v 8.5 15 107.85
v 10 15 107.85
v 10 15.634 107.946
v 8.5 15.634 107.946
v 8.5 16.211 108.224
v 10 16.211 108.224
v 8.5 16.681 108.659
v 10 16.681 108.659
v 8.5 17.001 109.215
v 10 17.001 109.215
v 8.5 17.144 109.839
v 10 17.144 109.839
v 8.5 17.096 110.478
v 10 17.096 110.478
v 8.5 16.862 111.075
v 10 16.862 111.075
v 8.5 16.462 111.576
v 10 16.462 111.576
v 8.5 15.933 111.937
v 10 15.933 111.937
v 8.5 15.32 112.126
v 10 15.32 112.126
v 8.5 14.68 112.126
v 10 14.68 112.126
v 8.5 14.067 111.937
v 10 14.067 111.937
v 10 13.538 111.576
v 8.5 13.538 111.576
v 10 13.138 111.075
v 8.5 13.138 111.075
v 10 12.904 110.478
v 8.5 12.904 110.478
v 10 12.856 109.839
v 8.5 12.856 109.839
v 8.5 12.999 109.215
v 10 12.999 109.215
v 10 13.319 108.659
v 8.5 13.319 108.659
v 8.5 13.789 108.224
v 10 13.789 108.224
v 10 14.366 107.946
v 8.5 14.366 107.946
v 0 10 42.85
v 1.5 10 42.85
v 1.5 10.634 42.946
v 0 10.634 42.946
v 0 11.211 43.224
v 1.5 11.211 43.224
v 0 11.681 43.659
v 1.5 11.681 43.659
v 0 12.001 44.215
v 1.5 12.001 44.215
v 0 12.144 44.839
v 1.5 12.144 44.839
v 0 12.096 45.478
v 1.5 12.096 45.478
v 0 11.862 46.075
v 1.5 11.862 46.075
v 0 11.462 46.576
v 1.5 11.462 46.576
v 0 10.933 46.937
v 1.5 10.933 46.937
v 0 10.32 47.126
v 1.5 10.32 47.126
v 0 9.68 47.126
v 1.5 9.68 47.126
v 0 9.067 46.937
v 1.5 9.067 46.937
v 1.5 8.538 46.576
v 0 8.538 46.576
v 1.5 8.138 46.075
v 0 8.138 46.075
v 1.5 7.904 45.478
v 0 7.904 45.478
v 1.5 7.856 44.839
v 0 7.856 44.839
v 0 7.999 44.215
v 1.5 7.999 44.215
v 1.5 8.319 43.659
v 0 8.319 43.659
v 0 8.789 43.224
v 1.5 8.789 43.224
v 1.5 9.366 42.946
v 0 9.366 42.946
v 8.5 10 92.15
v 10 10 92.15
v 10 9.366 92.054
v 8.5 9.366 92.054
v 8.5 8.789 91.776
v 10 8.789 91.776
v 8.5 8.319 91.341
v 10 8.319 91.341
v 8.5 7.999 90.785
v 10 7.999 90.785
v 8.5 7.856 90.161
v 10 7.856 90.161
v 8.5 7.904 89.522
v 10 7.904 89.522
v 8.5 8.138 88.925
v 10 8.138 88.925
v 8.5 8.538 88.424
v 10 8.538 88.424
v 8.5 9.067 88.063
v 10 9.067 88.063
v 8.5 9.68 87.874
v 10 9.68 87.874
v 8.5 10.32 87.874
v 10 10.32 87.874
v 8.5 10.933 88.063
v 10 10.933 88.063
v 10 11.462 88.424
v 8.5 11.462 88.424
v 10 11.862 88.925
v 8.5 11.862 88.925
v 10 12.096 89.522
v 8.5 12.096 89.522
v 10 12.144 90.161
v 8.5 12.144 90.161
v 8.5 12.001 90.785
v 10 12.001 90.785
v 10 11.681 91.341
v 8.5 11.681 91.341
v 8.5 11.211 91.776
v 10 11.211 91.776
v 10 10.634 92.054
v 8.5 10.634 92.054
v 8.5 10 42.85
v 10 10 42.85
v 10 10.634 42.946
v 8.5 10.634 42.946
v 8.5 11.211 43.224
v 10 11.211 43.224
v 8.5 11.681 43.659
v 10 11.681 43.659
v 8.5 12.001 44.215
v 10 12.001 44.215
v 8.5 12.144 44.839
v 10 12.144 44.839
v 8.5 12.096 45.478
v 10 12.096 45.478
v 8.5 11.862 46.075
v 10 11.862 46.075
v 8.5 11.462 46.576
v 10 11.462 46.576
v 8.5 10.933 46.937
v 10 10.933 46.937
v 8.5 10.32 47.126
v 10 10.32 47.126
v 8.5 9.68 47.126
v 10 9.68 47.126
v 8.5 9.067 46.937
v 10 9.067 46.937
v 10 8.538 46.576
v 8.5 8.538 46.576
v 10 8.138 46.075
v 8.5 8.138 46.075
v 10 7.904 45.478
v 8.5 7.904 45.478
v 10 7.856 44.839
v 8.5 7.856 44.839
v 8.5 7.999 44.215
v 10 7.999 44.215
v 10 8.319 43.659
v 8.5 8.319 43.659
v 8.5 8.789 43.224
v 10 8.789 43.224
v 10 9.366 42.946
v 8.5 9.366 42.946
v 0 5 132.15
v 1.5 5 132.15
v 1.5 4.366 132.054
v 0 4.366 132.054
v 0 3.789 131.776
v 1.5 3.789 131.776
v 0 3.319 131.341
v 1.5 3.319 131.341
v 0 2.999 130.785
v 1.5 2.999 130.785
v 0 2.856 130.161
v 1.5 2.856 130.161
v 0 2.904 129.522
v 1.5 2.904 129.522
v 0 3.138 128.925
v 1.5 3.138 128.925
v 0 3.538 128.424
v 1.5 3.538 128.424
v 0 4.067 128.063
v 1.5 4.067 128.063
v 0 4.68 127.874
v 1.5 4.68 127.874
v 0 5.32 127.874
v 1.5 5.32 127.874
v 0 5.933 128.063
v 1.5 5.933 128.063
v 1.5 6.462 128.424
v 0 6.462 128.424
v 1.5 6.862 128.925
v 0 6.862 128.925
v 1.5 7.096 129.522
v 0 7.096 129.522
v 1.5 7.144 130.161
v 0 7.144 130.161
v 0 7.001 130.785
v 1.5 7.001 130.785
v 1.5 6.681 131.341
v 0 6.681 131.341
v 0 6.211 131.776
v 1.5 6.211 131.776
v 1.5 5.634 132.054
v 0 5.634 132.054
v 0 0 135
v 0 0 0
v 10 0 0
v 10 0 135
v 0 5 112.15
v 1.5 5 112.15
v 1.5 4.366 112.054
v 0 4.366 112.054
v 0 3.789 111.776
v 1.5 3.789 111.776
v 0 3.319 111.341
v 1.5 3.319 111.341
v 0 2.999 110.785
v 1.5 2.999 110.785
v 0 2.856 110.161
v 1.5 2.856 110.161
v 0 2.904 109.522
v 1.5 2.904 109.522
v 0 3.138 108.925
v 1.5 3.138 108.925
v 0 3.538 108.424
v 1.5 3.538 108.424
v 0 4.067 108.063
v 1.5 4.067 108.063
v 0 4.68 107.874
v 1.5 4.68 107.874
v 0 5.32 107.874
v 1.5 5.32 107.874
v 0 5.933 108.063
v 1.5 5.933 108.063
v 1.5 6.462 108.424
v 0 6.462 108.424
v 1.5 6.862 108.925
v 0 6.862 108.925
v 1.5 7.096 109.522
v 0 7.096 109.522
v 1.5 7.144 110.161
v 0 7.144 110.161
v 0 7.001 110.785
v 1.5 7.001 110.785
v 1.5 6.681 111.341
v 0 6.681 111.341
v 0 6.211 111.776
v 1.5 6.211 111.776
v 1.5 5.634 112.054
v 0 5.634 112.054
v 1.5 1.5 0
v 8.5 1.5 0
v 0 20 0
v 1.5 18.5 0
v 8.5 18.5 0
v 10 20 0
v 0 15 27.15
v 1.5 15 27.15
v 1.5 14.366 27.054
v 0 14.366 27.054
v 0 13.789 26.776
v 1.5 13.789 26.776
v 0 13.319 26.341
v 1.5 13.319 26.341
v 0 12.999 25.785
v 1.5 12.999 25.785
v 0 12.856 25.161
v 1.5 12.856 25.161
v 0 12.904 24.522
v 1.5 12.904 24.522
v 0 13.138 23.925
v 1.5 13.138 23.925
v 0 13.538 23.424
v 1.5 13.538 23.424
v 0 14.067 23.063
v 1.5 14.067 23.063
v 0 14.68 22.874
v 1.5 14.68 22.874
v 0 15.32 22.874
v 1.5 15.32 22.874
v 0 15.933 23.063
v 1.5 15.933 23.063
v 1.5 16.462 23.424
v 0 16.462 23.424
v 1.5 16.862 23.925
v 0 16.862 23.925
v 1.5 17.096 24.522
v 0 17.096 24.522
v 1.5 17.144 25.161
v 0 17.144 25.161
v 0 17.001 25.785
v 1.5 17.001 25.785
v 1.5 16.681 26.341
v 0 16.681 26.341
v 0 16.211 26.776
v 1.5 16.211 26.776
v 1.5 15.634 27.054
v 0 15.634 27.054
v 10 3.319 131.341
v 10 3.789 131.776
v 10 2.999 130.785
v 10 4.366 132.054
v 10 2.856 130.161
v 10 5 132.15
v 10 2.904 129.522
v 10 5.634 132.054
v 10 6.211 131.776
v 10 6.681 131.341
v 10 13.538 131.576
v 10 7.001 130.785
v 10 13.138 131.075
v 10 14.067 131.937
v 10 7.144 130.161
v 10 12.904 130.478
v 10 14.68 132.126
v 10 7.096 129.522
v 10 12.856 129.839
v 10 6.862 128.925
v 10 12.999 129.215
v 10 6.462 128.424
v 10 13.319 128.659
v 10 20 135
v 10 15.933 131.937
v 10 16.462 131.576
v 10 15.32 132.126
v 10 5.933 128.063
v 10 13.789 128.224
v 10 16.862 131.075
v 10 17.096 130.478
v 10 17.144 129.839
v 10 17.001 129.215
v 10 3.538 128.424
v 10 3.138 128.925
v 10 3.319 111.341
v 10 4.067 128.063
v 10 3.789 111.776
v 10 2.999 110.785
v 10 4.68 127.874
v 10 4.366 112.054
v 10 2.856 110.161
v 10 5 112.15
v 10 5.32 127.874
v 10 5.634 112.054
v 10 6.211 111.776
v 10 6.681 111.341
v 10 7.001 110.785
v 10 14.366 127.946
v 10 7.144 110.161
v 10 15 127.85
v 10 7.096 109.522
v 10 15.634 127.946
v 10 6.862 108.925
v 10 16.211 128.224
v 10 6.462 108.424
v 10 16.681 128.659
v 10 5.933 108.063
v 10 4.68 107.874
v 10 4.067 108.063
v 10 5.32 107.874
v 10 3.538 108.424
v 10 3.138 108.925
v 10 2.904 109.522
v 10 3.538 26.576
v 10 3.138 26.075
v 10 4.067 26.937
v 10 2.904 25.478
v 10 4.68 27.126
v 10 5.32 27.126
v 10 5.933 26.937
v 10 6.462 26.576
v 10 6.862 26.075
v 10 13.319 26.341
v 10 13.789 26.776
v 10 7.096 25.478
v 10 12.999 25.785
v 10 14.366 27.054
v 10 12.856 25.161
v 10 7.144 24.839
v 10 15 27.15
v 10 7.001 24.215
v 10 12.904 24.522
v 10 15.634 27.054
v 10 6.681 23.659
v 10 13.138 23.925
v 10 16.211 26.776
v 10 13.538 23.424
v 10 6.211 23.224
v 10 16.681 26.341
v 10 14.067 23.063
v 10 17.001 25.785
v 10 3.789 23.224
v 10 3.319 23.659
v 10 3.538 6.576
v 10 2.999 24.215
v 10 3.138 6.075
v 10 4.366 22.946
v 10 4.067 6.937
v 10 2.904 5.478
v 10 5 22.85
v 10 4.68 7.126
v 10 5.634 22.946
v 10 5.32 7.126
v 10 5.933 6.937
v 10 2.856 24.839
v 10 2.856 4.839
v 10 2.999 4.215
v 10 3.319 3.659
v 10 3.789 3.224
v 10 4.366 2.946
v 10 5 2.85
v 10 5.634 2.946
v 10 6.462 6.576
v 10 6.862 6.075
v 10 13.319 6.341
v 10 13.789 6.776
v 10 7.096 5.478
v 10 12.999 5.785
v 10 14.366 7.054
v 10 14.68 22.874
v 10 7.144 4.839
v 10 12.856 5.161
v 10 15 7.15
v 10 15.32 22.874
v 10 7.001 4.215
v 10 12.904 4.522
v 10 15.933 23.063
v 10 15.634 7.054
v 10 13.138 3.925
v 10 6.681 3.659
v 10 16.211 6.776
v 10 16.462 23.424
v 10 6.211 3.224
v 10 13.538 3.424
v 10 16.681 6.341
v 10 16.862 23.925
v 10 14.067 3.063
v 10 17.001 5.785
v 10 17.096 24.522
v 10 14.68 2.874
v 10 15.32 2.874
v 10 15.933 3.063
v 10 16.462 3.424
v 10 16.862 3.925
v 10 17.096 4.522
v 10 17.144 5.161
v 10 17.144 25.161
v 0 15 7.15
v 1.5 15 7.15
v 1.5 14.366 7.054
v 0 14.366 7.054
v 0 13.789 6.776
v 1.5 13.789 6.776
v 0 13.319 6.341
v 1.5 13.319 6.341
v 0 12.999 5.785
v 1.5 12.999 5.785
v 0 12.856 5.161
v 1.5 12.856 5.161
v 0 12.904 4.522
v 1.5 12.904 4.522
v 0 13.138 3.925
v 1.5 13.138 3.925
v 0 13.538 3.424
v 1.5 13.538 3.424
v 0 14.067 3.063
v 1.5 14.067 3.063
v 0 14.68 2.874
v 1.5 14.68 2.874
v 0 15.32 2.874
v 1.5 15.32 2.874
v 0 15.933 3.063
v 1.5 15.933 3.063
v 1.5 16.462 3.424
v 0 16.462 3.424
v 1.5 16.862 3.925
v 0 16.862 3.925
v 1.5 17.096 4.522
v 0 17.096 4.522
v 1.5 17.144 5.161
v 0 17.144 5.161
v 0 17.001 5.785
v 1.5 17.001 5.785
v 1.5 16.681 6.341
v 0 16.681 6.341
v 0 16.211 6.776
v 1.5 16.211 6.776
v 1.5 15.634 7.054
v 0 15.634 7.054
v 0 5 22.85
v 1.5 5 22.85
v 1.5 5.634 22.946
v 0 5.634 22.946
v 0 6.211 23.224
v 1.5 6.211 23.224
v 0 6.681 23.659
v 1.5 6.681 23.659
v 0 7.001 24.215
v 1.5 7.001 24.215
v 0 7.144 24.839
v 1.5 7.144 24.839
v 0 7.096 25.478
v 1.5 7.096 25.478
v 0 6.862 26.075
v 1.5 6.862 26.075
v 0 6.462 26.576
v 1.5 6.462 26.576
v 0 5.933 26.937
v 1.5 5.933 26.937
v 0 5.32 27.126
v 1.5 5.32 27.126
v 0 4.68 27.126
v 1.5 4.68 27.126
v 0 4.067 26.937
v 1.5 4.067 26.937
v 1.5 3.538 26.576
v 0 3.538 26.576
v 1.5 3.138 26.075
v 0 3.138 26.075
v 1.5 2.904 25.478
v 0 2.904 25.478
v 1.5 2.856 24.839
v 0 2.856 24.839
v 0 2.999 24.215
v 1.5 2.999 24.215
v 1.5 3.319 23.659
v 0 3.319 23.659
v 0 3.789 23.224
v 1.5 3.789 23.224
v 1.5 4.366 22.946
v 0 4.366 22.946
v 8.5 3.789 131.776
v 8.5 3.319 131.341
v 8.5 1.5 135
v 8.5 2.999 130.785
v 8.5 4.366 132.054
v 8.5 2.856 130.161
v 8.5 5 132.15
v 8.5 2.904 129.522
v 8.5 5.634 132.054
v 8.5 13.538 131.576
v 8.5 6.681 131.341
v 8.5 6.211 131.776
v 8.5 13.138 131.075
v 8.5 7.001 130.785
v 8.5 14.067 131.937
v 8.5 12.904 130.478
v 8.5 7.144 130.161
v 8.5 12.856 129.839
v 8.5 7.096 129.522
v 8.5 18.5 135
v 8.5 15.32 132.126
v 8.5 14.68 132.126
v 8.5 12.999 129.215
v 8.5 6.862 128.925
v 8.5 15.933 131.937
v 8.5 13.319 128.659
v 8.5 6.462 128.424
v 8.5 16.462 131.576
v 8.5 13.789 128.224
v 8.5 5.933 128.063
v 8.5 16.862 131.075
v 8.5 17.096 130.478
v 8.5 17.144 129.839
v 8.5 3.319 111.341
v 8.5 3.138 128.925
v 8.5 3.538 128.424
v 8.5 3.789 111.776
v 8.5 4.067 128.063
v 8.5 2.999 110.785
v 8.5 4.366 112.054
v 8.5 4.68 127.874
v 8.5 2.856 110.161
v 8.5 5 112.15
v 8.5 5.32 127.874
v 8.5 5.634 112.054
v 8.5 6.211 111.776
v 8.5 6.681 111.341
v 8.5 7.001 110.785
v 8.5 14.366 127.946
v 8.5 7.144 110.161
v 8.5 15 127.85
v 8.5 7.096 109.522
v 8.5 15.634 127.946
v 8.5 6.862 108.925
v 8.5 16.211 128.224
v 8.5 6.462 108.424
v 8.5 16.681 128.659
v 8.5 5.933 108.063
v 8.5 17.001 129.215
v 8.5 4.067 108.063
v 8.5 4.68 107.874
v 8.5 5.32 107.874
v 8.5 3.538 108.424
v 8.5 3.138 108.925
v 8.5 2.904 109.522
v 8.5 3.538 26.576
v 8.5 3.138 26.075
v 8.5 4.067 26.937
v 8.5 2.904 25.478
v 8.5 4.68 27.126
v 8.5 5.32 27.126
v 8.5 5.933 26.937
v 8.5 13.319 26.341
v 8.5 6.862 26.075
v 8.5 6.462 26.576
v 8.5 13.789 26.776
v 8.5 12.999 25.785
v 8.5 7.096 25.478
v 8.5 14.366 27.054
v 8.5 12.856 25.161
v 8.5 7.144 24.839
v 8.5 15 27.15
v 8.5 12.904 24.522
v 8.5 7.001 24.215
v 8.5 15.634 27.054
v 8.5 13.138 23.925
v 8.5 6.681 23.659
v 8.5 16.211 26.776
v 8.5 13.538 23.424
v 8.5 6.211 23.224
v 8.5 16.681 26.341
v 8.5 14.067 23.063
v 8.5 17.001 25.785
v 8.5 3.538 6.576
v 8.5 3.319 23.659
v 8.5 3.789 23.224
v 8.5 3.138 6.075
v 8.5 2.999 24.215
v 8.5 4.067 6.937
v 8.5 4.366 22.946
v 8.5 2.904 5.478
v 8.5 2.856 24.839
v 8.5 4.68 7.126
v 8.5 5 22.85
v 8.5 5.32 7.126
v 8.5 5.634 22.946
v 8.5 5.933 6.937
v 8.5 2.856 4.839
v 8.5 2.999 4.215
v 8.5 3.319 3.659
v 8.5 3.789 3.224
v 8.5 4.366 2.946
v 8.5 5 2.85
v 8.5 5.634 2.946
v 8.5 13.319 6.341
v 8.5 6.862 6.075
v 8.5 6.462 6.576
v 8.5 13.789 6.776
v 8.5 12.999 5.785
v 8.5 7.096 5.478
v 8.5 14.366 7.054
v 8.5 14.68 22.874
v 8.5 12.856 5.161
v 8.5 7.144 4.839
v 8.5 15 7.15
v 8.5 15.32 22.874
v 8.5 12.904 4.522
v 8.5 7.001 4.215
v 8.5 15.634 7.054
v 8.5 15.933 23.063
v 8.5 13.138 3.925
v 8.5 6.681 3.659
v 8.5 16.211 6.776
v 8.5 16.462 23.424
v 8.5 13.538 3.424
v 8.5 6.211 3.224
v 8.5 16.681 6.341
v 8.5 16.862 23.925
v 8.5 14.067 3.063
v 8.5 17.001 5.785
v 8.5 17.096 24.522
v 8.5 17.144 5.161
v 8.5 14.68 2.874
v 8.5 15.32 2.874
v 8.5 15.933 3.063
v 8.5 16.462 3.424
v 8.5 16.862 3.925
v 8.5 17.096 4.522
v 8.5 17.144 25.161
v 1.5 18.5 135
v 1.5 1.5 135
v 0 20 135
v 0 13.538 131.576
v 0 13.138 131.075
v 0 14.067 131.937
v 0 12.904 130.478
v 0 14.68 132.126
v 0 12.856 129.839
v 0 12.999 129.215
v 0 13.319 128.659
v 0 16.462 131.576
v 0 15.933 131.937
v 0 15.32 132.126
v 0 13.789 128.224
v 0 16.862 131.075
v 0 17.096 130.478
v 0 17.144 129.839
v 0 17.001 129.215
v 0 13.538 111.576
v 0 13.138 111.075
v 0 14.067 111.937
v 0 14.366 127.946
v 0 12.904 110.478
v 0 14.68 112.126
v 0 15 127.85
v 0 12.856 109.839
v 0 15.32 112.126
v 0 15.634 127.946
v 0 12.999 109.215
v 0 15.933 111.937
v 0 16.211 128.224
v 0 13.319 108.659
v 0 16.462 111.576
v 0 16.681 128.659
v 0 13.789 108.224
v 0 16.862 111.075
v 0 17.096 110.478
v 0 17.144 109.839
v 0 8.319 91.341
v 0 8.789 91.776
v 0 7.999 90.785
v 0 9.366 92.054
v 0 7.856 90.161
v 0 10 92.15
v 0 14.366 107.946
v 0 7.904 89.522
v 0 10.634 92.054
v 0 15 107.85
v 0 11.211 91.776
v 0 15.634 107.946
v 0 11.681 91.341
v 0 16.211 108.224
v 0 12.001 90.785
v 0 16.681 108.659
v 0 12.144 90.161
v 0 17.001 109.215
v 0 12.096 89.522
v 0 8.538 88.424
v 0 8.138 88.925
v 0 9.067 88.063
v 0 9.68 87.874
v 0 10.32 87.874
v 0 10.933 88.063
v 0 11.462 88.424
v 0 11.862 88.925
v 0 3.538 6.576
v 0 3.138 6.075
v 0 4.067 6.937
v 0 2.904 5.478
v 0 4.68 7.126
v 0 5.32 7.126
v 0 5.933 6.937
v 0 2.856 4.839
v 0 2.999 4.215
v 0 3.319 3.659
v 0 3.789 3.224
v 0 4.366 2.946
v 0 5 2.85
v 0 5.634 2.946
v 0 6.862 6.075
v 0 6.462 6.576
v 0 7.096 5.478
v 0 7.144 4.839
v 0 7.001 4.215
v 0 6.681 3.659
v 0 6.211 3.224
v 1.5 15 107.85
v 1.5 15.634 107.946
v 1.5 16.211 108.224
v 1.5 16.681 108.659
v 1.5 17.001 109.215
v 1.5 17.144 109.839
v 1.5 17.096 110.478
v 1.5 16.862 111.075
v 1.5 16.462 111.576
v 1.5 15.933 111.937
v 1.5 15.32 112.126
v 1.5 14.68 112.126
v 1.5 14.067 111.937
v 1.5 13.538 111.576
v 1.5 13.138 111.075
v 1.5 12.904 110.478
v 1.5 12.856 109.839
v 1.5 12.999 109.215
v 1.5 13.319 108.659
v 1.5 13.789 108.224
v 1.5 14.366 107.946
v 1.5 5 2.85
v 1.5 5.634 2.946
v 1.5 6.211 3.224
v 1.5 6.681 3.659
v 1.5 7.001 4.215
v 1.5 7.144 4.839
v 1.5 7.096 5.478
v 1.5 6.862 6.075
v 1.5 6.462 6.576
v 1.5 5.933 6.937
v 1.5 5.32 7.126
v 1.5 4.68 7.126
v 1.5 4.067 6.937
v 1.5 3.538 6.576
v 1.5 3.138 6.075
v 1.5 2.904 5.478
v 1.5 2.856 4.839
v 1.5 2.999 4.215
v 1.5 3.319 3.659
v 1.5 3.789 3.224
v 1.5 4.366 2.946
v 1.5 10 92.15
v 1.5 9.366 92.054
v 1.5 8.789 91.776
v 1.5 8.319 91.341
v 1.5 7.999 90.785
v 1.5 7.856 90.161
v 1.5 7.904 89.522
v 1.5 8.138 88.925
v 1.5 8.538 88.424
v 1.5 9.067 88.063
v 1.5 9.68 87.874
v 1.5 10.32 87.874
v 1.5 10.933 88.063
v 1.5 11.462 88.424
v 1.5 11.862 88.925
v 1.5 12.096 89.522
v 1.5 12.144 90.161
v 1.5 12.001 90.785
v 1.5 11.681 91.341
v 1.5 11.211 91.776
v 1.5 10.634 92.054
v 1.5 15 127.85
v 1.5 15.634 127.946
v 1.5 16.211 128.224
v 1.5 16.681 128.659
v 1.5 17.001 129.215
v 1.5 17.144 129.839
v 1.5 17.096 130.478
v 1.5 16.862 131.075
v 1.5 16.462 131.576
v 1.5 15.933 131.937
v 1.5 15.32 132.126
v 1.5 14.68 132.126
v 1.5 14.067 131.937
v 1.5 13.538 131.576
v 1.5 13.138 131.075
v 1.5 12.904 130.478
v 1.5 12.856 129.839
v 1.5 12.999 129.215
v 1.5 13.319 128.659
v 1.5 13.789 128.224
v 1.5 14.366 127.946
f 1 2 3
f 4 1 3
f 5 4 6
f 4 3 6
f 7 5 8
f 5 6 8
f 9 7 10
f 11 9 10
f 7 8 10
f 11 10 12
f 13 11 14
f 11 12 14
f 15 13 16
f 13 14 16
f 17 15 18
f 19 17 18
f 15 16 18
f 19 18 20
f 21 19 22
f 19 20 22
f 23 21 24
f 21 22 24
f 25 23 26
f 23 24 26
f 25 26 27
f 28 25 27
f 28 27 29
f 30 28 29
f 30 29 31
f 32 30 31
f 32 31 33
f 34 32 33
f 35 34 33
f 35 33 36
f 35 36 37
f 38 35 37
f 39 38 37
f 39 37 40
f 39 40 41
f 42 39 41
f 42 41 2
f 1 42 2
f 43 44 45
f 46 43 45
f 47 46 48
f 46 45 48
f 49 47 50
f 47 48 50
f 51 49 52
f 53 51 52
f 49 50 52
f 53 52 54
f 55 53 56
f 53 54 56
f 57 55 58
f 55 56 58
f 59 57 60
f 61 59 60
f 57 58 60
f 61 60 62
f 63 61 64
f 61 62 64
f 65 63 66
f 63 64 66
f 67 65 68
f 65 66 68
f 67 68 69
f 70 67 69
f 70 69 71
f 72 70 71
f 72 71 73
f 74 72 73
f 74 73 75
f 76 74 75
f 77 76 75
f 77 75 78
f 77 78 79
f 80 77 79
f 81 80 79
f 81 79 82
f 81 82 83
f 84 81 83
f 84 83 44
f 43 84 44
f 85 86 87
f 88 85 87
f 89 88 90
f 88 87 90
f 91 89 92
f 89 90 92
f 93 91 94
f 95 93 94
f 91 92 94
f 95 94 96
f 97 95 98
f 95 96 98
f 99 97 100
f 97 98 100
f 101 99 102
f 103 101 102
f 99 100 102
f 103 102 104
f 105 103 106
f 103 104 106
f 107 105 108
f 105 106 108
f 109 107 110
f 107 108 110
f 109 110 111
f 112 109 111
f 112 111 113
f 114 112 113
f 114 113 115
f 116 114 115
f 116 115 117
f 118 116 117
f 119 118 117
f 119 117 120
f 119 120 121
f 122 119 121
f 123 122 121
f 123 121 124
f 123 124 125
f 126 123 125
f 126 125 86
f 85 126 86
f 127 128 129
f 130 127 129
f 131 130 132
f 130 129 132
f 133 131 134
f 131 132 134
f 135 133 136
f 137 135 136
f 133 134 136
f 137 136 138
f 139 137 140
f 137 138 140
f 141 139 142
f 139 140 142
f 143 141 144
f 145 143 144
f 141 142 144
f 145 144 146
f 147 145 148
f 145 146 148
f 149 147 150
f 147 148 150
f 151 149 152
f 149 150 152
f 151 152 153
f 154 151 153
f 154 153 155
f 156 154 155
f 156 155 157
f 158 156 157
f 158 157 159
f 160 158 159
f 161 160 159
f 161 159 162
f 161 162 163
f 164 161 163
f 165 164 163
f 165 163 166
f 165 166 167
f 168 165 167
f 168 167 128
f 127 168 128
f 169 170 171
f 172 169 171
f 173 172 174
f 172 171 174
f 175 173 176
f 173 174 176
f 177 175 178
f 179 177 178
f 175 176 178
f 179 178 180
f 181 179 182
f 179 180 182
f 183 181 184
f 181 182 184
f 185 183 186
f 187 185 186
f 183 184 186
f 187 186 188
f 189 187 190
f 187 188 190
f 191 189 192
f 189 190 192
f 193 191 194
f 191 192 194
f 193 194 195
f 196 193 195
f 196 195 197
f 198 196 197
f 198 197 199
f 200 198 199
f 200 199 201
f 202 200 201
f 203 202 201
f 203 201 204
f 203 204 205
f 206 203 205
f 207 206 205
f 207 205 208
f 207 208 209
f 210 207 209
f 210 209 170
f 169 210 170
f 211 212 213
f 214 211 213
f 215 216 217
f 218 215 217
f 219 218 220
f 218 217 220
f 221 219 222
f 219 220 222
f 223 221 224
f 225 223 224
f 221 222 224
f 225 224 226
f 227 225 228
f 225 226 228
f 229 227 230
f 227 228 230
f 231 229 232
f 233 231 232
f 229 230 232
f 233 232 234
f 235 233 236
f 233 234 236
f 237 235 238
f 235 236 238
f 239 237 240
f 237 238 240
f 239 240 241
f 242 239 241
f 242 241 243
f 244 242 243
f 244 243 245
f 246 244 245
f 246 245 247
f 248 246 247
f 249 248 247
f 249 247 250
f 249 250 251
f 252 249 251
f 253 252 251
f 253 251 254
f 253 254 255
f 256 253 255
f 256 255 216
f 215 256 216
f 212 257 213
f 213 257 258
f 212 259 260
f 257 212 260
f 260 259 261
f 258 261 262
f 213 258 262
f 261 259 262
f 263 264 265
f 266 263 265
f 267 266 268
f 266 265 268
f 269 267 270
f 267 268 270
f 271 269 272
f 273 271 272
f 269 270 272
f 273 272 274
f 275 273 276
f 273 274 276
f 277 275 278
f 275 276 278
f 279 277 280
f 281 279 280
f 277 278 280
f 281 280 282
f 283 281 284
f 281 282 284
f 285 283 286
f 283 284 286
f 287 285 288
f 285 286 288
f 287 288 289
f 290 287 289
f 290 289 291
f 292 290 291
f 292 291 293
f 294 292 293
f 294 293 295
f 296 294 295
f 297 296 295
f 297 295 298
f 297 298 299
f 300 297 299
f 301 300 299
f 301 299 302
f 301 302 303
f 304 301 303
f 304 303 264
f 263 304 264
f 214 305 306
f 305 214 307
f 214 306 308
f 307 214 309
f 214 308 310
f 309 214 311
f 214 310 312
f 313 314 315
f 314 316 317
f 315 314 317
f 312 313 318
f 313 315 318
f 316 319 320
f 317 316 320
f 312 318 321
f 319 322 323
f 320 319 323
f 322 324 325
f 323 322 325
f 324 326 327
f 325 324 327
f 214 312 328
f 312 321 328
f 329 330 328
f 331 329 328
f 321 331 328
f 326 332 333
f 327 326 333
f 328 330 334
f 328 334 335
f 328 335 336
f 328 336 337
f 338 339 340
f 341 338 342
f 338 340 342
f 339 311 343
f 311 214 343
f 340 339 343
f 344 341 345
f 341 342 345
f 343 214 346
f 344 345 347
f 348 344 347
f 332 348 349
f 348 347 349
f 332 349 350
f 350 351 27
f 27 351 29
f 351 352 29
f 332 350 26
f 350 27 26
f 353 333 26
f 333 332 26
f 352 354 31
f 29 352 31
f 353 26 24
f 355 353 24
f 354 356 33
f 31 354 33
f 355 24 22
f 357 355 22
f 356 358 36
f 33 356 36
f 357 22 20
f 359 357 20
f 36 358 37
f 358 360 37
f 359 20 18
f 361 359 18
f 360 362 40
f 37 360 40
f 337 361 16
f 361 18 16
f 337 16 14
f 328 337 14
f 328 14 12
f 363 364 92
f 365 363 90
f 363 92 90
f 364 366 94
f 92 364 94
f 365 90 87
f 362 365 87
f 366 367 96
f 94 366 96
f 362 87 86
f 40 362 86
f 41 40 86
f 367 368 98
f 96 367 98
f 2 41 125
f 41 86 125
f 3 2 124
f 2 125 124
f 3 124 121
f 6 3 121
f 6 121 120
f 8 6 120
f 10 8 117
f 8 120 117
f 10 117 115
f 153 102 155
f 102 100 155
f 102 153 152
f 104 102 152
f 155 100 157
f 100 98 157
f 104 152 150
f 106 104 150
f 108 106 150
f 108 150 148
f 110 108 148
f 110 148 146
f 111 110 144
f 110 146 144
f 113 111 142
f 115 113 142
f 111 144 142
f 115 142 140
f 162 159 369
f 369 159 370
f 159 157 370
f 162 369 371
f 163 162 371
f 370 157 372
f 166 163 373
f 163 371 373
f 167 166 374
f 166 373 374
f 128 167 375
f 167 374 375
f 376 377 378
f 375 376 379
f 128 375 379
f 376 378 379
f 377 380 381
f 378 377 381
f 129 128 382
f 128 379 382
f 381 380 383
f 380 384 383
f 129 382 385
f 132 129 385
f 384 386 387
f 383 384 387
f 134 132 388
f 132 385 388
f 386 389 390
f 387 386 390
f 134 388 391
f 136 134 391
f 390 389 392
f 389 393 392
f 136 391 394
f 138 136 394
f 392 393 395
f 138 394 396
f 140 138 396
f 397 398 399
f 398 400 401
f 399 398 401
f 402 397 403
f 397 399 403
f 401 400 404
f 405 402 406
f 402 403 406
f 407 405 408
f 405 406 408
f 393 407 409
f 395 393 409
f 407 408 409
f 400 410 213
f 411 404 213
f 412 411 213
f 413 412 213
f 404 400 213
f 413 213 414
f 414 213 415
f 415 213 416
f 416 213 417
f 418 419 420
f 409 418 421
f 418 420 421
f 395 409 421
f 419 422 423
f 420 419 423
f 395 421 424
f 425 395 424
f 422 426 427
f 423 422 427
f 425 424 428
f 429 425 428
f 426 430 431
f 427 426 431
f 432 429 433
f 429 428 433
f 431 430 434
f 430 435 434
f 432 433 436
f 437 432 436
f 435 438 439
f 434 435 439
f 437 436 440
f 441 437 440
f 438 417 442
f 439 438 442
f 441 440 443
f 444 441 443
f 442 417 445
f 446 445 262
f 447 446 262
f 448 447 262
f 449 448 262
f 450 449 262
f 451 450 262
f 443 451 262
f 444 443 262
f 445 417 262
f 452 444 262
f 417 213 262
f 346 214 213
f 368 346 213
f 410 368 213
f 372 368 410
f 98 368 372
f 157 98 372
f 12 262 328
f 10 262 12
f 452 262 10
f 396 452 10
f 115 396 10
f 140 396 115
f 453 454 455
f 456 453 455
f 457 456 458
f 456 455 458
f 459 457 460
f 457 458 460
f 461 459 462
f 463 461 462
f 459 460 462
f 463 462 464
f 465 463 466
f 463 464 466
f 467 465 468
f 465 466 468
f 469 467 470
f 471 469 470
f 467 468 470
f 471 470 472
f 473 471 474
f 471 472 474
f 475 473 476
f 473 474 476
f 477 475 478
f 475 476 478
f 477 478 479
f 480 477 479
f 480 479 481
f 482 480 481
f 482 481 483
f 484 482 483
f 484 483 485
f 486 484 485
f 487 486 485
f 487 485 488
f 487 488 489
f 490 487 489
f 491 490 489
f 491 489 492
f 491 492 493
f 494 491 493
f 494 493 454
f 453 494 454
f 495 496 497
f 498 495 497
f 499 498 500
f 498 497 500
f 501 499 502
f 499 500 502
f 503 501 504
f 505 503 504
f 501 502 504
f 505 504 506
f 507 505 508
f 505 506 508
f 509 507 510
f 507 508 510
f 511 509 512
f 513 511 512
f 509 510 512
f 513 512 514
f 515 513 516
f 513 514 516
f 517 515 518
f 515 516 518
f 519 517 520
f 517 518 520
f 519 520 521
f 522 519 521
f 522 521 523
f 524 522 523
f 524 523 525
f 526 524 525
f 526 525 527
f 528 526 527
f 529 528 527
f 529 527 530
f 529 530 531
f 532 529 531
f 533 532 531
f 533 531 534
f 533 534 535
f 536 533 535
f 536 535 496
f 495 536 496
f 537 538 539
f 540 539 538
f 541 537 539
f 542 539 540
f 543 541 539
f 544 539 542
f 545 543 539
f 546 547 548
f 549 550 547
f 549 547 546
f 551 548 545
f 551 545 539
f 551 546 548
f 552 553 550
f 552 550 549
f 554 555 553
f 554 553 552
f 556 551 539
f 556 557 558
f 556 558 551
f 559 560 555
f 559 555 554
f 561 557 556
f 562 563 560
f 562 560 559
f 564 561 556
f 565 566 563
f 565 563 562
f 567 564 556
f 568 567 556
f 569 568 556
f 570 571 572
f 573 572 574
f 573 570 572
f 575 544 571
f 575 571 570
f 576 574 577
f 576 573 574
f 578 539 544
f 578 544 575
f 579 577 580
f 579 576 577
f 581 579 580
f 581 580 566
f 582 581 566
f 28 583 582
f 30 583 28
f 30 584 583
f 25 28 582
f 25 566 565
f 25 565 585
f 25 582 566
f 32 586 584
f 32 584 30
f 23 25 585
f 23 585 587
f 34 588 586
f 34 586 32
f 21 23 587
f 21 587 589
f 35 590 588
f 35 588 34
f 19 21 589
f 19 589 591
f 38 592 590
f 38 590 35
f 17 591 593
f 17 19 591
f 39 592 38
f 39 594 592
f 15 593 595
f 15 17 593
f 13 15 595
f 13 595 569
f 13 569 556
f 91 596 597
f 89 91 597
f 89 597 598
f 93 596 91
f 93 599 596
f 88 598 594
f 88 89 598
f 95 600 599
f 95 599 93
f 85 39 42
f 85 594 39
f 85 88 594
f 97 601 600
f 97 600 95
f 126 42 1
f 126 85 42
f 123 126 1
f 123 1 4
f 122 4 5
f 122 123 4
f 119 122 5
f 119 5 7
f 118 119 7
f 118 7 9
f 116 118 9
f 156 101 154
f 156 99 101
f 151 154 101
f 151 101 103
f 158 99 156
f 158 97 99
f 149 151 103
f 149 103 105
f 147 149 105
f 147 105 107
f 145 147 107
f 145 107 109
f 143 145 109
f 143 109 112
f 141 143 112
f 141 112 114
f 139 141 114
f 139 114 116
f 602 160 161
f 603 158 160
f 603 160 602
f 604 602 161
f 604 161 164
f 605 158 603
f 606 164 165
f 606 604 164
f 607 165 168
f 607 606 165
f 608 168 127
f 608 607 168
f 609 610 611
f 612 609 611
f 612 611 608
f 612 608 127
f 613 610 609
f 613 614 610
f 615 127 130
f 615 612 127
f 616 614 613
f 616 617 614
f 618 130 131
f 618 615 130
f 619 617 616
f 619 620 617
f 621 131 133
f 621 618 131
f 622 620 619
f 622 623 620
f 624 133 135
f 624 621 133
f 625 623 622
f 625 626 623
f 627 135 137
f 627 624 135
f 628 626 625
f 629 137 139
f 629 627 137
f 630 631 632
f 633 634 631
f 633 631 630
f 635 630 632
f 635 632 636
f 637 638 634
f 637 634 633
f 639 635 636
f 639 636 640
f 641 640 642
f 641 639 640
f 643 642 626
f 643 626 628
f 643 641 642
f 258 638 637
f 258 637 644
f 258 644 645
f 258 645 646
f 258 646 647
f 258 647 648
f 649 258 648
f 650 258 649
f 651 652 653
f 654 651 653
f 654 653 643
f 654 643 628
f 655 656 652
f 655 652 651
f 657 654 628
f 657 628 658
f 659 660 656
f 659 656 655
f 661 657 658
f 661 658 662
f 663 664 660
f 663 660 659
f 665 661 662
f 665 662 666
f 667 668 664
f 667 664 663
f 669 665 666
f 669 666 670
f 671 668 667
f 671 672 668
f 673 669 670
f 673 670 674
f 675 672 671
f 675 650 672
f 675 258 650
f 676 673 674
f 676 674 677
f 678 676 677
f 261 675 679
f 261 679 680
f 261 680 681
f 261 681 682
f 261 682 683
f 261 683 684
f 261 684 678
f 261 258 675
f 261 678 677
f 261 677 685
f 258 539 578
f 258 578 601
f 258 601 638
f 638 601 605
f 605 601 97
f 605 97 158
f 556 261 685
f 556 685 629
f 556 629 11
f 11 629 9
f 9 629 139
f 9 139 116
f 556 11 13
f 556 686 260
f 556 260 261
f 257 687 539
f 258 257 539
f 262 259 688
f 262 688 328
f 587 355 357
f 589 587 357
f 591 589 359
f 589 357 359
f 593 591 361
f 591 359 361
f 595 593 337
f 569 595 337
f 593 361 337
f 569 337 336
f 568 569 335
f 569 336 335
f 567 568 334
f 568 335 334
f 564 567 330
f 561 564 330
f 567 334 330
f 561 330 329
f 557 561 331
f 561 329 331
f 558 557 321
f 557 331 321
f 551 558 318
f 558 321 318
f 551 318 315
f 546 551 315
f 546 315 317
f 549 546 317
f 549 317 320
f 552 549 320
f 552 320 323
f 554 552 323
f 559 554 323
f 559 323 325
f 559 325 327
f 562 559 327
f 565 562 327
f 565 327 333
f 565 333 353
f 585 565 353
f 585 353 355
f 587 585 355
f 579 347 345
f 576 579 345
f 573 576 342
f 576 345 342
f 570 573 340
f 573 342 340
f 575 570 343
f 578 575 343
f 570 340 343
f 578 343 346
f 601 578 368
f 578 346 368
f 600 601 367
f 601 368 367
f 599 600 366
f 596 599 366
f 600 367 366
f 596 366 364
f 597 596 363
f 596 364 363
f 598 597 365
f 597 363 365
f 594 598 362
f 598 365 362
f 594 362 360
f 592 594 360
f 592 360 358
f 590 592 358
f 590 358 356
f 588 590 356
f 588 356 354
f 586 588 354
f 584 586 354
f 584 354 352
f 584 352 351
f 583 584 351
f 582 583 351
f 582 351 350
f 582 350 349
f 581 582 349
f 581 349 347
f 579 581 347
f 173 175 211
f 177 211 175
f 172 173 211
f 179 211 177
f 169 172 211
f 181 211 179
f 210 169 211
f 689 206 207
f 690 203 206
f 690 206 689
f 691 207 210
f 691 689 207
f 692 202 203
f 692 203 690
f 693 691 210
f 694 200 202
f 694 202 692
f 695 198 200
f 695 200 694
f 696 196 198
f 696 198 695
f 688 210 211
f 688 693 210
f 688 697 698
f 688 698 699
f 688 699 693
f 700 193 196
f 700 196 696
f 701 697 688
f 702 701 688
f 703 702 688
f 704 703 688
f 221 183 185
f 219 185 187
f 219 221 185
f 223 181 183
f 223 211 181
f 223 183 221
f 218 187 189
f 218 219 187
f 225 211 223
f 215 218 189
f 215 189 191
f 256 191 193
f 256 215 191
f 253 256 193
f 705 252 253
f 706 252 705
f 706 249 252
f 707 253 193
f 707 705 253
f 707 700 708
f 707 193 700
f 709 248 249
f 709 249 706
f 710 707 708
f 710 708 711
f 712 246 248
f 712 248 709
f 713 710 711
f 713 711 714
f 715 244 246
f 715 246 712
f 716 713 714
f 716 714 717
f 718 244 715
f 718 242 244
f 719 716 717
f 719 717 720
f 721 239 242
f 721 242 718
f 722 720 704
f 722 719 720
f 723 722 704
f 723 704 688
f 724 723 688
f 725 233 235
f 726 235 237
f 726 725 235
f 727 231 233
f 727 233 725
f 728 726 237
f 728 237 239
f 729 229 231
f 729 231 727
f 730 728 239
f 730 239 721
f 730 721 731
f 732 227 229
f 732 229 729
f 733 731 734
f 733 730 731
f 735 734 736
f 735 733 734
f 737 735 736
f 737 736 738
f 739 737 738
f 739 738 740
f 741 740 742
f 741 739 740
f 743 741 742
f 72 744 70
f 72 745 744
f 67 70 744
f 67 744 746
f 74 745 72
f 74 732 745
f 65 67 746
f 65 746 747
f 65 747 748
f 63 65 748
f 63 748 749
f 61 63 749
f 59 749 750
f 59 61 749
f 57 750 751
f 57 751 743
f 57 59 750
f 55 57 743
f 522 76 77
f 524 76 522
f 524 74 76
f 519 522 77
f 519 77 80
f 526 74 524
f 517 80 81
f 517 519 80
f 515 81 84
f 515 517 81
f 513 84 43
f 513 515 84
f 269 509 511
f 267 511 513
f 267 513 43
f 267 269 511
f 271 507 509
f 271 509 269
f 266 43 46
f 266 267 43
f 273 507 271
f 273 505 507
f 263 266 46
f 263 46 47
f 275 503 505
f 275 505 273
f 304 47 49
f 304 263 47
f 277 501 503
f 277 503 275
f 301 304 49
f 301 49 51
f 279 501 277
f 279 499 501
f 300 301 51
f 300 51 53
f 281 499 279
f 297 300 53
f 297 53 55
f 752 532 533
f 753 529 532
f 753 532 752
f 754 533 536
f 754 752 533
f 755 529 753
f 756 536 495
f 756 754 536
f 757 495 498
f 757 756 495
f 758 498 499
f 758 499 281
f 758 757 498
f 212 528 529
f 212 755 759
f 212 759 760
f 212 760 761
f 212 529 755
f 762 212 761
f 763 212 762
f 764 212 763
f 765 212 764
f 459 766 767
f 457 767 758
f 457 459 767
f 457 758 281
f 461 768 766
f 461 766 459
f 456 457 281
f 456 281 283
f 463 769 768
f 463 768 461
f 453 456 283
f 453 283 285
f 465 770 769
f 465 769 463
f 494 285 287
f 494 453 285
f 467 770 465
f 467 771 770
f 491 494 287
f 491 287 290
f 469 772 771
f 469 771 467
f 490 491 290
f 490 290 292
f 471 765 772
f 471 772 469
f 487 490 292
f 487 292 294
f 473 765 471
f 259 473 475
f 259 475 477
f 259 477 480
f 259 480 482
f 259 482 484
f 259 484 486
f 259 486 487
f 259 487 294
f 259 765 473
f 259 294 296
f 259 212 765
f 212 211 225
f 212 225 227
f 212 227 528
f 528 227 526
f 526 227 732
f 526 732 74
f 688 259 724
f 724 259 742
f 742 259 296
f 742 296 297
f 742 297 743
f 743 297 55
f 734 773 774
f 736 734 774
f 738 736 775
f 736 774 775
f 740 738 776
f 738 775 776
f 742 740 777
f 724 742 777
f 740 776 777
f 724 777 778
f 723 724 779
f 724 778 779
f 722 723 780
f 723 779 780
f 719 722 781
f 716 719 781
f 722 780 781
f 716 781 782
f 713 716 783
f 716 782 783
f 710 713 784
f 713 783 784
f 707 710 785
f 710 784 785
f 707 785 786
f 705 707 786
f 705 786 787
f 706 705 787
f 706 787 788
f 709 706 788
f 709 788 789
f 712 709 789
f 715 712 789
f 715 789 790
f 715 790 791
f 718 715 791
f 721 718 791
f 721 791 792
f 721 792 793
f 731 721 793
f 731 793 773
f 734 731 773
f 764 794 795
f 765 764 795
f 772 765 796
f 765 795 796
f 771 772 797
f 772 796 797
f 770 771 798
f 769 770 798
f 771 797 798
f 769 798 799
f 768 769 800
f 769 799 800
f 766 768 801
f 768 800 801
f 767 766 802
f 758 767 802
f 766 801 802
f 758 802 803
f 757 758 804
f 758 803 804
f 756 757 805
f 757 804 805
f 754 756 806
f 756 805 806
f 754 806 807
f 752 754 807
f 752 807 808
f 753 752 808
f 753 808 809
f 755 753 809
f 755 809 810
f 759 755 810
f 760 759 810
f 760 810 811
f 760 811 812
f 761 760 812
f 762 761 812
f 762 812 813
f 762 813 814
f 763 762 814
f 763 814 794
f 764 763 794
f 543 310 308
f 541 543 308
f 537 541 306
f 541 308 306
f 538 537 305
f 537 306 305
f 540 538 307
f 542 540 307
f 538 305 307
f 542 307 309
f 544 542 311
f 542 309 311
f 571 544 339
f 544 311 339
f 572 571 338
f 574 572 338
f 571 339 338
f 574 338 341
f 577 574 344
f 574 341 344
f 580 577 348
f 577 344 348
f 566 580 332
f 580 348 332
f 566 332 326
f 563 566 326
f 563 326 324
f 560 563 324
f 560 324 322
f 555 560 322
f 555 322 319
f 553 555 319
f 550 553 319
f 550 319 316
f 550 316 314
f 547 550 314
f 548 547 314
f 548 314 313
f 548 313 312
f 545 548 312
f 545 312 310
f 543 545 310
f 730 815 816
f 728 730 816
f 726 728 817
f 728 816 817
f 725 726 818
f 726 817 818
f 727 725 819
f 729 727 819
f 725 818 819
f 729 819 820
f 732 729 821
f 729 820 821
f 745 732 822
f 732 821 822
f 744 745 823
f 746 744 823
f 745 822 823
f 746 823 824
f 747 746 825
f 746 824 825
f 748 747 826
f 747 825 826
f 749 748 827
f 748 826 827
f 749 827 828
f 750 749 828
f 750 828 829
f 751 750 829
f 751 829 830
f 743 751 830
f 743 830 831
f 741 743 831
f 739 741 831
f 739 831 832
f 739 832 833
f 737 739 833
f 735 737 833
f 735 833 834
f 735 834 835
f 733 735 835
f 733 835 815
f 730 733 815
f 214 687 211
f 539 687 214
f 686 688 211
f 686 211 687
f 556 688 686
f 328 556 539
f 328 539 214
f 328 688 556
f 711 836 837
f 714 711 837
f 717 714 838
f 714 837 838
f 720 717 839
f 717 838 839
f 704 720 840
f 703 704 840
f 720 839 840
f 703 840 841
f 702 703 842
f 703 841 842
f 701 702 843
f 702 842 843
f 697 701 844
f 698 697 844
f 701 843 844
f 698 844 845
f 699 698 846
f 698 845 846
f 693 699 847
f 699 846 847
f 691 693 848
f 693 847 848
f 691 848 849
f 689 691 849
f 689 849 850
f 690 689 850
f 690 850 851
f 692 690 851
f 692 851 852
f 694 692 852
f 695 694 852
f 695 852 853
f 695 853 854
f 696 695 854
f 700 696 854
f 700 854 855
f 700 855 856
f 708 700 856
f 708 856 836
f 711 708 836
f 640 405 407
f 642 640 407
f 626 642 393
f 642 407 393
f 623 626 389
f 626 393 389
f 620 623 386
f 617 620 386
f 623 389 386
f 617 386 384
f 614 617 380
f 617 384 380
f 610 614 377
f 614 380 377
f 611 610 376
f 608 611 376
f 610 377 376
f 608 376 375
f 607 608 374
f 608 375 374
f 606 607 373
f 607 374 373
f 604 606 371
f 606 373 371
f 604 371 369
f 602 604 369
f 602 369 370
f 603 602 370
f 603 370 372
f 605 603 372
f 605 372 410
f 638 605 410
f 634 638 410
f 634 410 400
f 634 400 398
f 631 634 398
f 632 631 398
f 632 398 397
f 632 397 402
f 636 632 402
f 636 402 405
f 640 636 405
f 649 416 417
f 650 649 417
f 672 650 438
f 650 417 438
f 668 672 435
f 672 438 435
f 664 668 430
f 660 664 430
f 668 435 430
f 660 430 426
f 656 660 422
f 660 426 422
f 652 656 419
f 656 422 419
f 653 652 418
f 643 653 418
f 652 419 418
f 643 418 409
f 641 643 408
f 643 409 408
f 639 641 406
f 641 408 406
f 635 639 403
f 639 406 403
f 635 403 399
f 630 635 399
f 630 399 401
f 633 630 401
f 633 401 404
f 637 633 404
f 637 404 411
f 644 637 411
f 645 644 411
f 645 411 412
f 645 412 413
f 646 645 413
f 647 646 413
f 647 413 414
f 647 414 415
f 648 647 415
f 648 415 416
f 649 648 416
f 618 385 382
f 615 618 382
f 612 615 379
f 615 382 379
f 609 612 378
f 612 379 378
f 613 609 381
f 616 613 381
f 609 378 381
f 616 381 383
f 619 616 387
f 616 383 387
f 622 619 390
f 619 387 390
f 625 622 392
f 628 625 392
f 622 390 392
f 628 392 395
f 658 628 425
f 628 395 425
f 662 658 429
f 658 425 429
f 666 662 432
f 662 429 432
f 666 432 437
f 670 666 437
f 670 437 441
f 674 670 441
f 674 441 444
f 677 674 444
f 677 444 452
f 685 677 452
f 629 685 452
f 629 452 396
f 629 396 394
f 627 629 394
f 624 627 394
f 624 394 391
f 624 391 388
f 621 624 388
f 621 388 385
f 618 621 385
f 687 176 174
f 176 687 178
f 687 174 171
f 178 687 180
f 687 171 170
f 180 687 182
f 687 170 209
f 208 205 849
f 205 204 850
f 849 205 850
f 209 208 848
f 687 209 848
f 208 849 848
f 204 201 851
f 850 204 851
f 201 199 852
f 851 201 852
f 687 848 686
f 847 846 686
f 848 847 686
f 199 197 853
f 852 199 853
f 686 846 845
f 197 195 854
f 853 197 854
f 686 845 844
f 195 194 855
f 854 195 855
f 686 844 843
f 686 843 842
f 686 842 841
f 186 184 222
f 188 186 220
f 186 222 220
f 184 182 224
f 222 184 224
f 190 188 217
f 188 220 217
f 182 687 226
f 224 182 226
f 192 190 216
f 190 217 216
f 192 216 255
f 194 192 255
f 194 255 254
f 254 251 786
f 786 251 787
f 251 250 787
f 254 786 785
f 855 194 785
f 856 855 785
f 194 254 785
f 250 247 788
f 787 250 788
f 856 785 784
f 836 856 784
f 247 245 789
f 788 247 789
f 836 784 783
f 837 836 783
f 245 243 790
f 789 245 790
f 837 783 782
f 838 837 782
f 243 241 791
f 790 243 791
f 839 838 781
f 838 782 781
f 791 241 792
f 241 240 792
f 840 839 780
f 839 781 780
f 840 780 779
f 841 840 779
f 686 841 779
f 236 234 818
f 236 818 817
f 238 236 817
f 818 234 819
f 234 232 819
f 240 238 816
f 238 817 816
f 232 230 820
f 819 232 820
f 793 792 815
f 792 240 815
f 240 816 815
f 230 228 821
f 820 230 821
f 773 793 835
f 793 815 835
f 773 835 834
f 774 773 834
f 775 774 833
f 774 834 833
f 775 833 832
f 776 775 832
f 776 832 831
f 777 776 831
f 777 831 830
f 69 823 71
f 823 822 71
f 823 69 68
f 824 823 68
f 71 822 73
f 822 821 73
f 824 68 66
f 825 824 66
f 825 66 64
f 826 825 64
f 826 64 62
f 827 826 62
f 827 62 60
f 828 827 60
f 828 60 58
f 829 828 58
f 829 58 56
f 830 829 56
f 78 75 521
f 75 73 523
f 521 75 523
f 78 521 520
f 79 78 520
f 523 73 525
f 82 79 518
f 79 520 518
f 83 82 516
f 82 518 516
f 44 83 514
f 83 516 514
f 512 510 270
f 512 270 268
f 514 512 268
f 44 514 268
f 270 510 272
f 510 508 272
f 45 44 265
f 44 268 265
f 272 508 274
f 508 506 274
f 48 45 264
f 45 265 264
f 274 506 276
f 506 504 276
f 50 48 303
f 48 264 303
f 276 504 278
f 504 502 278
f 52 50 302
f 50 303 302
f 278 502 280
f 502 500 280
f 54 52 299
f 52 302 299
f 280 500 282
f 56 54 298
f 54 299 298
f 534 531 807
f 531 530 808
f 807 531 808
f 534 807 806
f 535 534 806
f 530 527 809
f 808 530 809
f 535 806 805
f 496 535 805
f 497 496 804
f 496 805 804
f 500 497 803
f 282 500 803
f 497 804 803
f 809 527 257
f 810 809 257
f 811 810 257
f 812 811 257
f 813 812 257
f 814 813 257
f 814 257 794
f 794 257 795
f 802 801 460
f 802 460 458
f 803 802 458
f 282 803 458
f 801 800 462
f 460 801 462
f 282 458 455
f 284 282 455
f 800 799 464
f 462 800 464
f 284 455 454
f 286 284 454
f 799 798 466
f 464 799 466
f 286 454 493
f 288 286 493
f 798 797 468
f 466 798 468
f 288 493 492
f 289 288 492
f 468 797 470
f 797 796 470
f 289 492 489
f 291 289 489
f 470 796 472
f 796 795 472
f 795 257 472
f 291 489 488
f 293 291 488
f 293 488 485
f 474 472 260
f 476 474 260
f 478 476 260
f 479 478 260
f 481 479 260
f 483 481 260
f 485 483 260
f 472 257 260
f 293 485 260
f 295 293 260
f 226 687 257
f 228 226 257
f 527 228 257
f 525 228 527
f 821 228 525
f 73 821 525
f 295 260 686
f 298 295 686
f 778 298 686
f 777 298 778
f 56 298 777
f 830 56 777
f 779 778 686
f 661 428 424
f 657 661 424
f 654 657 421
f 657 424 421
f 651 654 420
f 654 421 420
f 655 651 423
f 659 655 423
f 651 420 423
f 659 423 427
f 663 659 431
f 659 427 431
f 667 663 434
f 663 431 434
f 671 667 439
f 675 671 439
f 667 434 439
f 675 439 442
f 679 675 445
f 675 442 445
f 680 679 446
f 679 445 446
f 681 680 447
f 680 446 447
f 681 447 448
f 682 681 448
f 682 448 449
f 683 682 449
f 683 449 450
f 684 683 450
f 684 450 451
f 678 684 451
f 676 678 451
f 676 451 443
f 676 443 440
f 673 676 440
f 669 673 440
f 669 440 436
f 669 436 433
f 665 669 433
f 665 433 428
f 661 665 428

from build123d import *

# Parameters (mm, degrees)
SKETCH_1_W          = 10
SKETCH_1_H          = 20
SKETCH_1_W_2        = 7
SKETCH_1_H_2        = 17
EXTRUDE_1_DEPTH     = 135
CUT_EXTRUDE_2_REACH = 138.839
SKETCH_3_R          = 2.15


with BuildPart() as part:
    # ｽｹｯﾁ1 → 押し出し-薄板1 (new body)
    with BuildSketch(Plane.XY):
        with Locations((5, 10)):
            Rectangle(SKETCH_1_W, SKETCH_1_H)
        with Locations((5, 10)):
            Rectangle(SKETCH_1_W_2, SKETCH_1_H_2, mode=Mode.SUBTRACT)
    extrude(amount=EXTRUDE_1_DEPTH)

    # ｶｯﾄ - 押し出し2: up to this face of the body (flat: up to its plane)
    cut_extrude_2_end = Plane(part.part.faces().sort_by_distance((0, 10, 67.5))[0])
    # ｽｹｯﾁ3 → ｶｯﾄ - 押し出し2 (cut, up to the picked face)
    with BuildSketch(Plane(origin=(10, 0, 0), x_dir=(0, 0, -1), z_dir=(1, 0, 0)), mode=Mode.PRIVATE) as cut_extrude_2_sk1:
        with Locations((-130, 15)):
            Circle(SKETCH_3_R)
    cut_extrude_2_tool1 = split(extrude(cut_extrude_2_sk1.sketch, amount=-CUT_EXTRUDE_2_REACH, mode=Mode.PRIVATE), bisect_by=cut_extrude_2_end, keep=Keep.BOTH, mode=Mode.PRIVATE)
    # ｽｹｯﾁ3 → ｶｯﾄ - 押し出し2 (cut, up to the picked face)
    with BuildSketch(Plane(origin=(10, 0, 0), x_dir=(0, 0, -1), z_dir=(1, 0, 0)), mode=Mode.PRIVATE) as cut_extrude_2_sk2:
        with Locations((-110, 15)):
            Circle(SKETCH_3_R)
    cut_extrude_2_tool2 = split(extrude(cut_extrude_2_sk2.sketch, amount=-CUT_EXTRUDE_2_REACH, mode=Mode.PRIVATE), bisect_by=cut_extrude_2_end, keep=Keep.BOTH, mode=Mode.PRIVATE)
    # ｽｹｯﾁ3 → ｶｯﾄ - 押し出し2 (cut, up to the picked face)
    with BuildSketch(Plane(origin=(10, 0, 0), x_dir=(0, 0, -1), z_dir=(1, 0, 0)), mode=Mode.PRIVATE) as cut_extrude_2_sk3:
        with Locations(Location((-25, 15, 0), (0, 0, 180))):
            Circle(SKETCH_3_R)
    cut_extrude_2_tool3 = split(extrude(cut_extrude_2_sk3.sketch, amount=-CUT_EXTRUDE_2_REACH, mode=Mode.PRIVATE), bisect_by=cut_extrude_2_end, keep=Keep.BOTH, mode=Mode.PRIVATE)
    # ｽｹｯﾁ3 → ｶｯﾄ - 押し出し2 (cut, up to the picked face)
    with BuildSketch(Plane(origin=(10, 0, 0), x_dir=(0, 0, -1), z_dir=(1, 0, 0)), mode=Mode.PRIVATE) as cut_extrude_2_sk4:
        with Locations(Location((-5, 15, 0), (0, 0, 180))):
            Circle(SKETCH_3_R)
    cut_extrude_2_tool4 = split(extrude(cut_extrude_2_sk4.sketch, amount=-CUT_EXTRUDE_2_REACH, mode=Mode.PRIVATE), bisect_by=cut_extrude_2_end, keep=Keep.BOTH, mode=Mode.PRIVATE)
    # ｽｹｯﾁ3 → ｶｯﾄ - 押し出し2 (cut, up to the picked face)
    with BuildSketch(Plane(origin=(10, 0, 0), x_dir=(0, 0, -1), z_dir=(1, 0, 0)), mode=Mode.PRIVATE) as cut_extrude_2_sk5:
        with Locations((-5, 5)):
            Circle(SKETCH_3_R)
    cut_extrude_2_tool5 = split(extrude(cut_extrude_2_sk5.sketch, amount=-CUT_EXTRUDE_2_REACH, mode=Mode.PRIVATE), bisect_by=cut_extrude_2_end, keep=Keep.BOTH, mode=Mode.PRIVATE)
    # ｽｹｯﾁ3 → ｶｯﾄ - 押し出し2 (cut, up to the picked face)
    with BuildSketch(Plane(origin=(10, 0, 0), x_dir=(0, 0, -1), z_dir=(1, 0, 0)), mode=Mode.PRIVATE) as cut_extrude_2_sk6:
        with Locations((-25, 5)):
            Circle(SKETCH_3_R)
    cut_extrude_2_tool6 = split(extrude(cut_extrude_2_sk6.sketch, amount=-CUT_EXTRUDE_2_REACH, mode=Mode.PRIVATE), bisect_by=cut_extrude_2_end, keep=Keep.BOTH, mode=Mode.PRIVATE)
    # ｽｹｯﾁ3 → ｶｯﾄ - 押し出し2 (cut, up to the picked face)
    with BuildSketch(Plane(origin=(10, 0, 0), x_dir=(0, 0, -1), z_dir=(1, 0, 0)), mode=Mode.PRIVATE) as cut_extrude_2_sk7:
        with Locations(Location((-110, 5, 0), (0, 0, 180))):
            Circle(SKETCH_3_R)
    cut_extrude_2_tool7 = split(extrude(cut_extrude_2_sk7.sketch, amount=-CUT_EXTRUDE_2_REACH, mode=Mode.PRIVATE), bisect_by=cut_extrude_2_end, keep=Keep.BOTH, mode=Mode.PRIVATE)
    # ｽｹｯﾁ3 → ｶｯﾄ - 押し出し2 (cut, up to the picked face)
    with BuildSketch(Plane(origin=(10, 0, 0), x_dir=(0, 0, -1), z_dir=(1, 0, 0)), mode=Mode.PRIVATE) as cut_extrude_2_sk8:
        with Locations(Location((-130, 5, 0), (0, 0, 180))):
            Circle(SKETCH_3_R)
    cut_extrude_2_tool8 = split(extrude(cut_extrude_2_sk8.sketch, amount=-CUT_EXTRUDE_2_REACH, mode=Mode.PRIVATE), bisect_by=cut_extrude_2_end, keep=Keep.BOTH, mode=Mode.PRIVATE)
    # ｽｹｯﾁ3 → ｶｯﾄ - 押し出し2 (cut, up to the picked face)
    with BuildSketch(Plane(origin=(10, 0, 0), x_dir=(0, 0, -1), z_dir=(1, 0, 0)), mode=Mode.PRIVATE) as cut_extrude_2_sk9:
        with Locations((-45, 10)):
            Circle(SKETCH_3_R)
    cut_extrude_2_tool9 = split(extrude(cut_extrude_2_sk9.sketch, amount=-CUT_EXTRUDE_2_REACH, mode=Mode.PRIVATE), bisect_by=cut_extrude_2_end, keep=Keep.BOTH, mode=Mode.PRIVATE)
    # ｽｹｯﾁ3 → ｶｯﾄ - 押し出し2 (cut, up to the picked face)
    with BuildSketch(Plane(origin=(10, 0, 0), x_dir=(0, 0, -1), z_dir=(1, 0, 0)), mode=Mode.PRIVATE) as cut_extrude_2_sk10:
        with Locations(Location((-90, 10, 0), (0, 0, 180))):
            Circle(SKETCH_3_R)
    cut_extrude_2_tool10 = split(extrude(cut_extrude_2_sk10.sketch, amount=-CUT_EXTRUDE_2_REACH, mode=Mode.PRIVATE), bisect_by=cut_extrude_2_end, keep=Keep.BOTH, mode=Mode.PRIVATE)
    add(cut_extrude_2_tool1.solids().sort_by(Axis((10, 15, 130), (-1, 0, 0)))[0], mode=Mode.SUBTRACT)
    add(cut_extrude_2_tool2.solids().sort_by(Axis((10, 15, 110), (-1, 0, 0)))[0], mode=Mode.SUBTRACT)
    add(cut_extrude_2_tool3.solids().sort_by(Axis((10, 15, 25), (-1, 0, 0)))[0], mode=Mode.SUBTRACT)
    add(cut_extrude_2_tool4.solids().sort_by(Axis((10, 15, 5), (-1, 0, 0)))[0], mode=Mode.SUBTRACT)
    add(cut_extrude_2_tool5.solids().sort_by(Axis((10, 5, 5), (-1, 0, 0)))[0], mode=Mode.SUBTRACT)
    add(cut_extrude_2_tool6.solids().sort_by(Axis((10, 5, 25), (-1, 0, 0)))[0], mode=Mode.SUBTRACT)
    add(cut_extrude_2_tool7.solids().sort_by(Axis((10, 5, 110), (-1, 0, 0)))[0], mode=Mode.SUBTRACT)
    add(cut_extrude_2_tool8.solids().sort_by(Axis((10, 5, 130), (-1, 0, 0)))[0], mode=Mode.SUBTRACT)
    add(cut_extrude_2_tool9.solids().sort_by(Axis((10, 10, 45), (-1, 0, 0)))[0], mode=Mode.SUBTRACT)
    add(cut_extrude_2_tool10.solids().sort_by(Axis((10, 10, 90), (-1, 0, 0)))[0], mode=Mode.SUBTRACT)


solid = part.part
